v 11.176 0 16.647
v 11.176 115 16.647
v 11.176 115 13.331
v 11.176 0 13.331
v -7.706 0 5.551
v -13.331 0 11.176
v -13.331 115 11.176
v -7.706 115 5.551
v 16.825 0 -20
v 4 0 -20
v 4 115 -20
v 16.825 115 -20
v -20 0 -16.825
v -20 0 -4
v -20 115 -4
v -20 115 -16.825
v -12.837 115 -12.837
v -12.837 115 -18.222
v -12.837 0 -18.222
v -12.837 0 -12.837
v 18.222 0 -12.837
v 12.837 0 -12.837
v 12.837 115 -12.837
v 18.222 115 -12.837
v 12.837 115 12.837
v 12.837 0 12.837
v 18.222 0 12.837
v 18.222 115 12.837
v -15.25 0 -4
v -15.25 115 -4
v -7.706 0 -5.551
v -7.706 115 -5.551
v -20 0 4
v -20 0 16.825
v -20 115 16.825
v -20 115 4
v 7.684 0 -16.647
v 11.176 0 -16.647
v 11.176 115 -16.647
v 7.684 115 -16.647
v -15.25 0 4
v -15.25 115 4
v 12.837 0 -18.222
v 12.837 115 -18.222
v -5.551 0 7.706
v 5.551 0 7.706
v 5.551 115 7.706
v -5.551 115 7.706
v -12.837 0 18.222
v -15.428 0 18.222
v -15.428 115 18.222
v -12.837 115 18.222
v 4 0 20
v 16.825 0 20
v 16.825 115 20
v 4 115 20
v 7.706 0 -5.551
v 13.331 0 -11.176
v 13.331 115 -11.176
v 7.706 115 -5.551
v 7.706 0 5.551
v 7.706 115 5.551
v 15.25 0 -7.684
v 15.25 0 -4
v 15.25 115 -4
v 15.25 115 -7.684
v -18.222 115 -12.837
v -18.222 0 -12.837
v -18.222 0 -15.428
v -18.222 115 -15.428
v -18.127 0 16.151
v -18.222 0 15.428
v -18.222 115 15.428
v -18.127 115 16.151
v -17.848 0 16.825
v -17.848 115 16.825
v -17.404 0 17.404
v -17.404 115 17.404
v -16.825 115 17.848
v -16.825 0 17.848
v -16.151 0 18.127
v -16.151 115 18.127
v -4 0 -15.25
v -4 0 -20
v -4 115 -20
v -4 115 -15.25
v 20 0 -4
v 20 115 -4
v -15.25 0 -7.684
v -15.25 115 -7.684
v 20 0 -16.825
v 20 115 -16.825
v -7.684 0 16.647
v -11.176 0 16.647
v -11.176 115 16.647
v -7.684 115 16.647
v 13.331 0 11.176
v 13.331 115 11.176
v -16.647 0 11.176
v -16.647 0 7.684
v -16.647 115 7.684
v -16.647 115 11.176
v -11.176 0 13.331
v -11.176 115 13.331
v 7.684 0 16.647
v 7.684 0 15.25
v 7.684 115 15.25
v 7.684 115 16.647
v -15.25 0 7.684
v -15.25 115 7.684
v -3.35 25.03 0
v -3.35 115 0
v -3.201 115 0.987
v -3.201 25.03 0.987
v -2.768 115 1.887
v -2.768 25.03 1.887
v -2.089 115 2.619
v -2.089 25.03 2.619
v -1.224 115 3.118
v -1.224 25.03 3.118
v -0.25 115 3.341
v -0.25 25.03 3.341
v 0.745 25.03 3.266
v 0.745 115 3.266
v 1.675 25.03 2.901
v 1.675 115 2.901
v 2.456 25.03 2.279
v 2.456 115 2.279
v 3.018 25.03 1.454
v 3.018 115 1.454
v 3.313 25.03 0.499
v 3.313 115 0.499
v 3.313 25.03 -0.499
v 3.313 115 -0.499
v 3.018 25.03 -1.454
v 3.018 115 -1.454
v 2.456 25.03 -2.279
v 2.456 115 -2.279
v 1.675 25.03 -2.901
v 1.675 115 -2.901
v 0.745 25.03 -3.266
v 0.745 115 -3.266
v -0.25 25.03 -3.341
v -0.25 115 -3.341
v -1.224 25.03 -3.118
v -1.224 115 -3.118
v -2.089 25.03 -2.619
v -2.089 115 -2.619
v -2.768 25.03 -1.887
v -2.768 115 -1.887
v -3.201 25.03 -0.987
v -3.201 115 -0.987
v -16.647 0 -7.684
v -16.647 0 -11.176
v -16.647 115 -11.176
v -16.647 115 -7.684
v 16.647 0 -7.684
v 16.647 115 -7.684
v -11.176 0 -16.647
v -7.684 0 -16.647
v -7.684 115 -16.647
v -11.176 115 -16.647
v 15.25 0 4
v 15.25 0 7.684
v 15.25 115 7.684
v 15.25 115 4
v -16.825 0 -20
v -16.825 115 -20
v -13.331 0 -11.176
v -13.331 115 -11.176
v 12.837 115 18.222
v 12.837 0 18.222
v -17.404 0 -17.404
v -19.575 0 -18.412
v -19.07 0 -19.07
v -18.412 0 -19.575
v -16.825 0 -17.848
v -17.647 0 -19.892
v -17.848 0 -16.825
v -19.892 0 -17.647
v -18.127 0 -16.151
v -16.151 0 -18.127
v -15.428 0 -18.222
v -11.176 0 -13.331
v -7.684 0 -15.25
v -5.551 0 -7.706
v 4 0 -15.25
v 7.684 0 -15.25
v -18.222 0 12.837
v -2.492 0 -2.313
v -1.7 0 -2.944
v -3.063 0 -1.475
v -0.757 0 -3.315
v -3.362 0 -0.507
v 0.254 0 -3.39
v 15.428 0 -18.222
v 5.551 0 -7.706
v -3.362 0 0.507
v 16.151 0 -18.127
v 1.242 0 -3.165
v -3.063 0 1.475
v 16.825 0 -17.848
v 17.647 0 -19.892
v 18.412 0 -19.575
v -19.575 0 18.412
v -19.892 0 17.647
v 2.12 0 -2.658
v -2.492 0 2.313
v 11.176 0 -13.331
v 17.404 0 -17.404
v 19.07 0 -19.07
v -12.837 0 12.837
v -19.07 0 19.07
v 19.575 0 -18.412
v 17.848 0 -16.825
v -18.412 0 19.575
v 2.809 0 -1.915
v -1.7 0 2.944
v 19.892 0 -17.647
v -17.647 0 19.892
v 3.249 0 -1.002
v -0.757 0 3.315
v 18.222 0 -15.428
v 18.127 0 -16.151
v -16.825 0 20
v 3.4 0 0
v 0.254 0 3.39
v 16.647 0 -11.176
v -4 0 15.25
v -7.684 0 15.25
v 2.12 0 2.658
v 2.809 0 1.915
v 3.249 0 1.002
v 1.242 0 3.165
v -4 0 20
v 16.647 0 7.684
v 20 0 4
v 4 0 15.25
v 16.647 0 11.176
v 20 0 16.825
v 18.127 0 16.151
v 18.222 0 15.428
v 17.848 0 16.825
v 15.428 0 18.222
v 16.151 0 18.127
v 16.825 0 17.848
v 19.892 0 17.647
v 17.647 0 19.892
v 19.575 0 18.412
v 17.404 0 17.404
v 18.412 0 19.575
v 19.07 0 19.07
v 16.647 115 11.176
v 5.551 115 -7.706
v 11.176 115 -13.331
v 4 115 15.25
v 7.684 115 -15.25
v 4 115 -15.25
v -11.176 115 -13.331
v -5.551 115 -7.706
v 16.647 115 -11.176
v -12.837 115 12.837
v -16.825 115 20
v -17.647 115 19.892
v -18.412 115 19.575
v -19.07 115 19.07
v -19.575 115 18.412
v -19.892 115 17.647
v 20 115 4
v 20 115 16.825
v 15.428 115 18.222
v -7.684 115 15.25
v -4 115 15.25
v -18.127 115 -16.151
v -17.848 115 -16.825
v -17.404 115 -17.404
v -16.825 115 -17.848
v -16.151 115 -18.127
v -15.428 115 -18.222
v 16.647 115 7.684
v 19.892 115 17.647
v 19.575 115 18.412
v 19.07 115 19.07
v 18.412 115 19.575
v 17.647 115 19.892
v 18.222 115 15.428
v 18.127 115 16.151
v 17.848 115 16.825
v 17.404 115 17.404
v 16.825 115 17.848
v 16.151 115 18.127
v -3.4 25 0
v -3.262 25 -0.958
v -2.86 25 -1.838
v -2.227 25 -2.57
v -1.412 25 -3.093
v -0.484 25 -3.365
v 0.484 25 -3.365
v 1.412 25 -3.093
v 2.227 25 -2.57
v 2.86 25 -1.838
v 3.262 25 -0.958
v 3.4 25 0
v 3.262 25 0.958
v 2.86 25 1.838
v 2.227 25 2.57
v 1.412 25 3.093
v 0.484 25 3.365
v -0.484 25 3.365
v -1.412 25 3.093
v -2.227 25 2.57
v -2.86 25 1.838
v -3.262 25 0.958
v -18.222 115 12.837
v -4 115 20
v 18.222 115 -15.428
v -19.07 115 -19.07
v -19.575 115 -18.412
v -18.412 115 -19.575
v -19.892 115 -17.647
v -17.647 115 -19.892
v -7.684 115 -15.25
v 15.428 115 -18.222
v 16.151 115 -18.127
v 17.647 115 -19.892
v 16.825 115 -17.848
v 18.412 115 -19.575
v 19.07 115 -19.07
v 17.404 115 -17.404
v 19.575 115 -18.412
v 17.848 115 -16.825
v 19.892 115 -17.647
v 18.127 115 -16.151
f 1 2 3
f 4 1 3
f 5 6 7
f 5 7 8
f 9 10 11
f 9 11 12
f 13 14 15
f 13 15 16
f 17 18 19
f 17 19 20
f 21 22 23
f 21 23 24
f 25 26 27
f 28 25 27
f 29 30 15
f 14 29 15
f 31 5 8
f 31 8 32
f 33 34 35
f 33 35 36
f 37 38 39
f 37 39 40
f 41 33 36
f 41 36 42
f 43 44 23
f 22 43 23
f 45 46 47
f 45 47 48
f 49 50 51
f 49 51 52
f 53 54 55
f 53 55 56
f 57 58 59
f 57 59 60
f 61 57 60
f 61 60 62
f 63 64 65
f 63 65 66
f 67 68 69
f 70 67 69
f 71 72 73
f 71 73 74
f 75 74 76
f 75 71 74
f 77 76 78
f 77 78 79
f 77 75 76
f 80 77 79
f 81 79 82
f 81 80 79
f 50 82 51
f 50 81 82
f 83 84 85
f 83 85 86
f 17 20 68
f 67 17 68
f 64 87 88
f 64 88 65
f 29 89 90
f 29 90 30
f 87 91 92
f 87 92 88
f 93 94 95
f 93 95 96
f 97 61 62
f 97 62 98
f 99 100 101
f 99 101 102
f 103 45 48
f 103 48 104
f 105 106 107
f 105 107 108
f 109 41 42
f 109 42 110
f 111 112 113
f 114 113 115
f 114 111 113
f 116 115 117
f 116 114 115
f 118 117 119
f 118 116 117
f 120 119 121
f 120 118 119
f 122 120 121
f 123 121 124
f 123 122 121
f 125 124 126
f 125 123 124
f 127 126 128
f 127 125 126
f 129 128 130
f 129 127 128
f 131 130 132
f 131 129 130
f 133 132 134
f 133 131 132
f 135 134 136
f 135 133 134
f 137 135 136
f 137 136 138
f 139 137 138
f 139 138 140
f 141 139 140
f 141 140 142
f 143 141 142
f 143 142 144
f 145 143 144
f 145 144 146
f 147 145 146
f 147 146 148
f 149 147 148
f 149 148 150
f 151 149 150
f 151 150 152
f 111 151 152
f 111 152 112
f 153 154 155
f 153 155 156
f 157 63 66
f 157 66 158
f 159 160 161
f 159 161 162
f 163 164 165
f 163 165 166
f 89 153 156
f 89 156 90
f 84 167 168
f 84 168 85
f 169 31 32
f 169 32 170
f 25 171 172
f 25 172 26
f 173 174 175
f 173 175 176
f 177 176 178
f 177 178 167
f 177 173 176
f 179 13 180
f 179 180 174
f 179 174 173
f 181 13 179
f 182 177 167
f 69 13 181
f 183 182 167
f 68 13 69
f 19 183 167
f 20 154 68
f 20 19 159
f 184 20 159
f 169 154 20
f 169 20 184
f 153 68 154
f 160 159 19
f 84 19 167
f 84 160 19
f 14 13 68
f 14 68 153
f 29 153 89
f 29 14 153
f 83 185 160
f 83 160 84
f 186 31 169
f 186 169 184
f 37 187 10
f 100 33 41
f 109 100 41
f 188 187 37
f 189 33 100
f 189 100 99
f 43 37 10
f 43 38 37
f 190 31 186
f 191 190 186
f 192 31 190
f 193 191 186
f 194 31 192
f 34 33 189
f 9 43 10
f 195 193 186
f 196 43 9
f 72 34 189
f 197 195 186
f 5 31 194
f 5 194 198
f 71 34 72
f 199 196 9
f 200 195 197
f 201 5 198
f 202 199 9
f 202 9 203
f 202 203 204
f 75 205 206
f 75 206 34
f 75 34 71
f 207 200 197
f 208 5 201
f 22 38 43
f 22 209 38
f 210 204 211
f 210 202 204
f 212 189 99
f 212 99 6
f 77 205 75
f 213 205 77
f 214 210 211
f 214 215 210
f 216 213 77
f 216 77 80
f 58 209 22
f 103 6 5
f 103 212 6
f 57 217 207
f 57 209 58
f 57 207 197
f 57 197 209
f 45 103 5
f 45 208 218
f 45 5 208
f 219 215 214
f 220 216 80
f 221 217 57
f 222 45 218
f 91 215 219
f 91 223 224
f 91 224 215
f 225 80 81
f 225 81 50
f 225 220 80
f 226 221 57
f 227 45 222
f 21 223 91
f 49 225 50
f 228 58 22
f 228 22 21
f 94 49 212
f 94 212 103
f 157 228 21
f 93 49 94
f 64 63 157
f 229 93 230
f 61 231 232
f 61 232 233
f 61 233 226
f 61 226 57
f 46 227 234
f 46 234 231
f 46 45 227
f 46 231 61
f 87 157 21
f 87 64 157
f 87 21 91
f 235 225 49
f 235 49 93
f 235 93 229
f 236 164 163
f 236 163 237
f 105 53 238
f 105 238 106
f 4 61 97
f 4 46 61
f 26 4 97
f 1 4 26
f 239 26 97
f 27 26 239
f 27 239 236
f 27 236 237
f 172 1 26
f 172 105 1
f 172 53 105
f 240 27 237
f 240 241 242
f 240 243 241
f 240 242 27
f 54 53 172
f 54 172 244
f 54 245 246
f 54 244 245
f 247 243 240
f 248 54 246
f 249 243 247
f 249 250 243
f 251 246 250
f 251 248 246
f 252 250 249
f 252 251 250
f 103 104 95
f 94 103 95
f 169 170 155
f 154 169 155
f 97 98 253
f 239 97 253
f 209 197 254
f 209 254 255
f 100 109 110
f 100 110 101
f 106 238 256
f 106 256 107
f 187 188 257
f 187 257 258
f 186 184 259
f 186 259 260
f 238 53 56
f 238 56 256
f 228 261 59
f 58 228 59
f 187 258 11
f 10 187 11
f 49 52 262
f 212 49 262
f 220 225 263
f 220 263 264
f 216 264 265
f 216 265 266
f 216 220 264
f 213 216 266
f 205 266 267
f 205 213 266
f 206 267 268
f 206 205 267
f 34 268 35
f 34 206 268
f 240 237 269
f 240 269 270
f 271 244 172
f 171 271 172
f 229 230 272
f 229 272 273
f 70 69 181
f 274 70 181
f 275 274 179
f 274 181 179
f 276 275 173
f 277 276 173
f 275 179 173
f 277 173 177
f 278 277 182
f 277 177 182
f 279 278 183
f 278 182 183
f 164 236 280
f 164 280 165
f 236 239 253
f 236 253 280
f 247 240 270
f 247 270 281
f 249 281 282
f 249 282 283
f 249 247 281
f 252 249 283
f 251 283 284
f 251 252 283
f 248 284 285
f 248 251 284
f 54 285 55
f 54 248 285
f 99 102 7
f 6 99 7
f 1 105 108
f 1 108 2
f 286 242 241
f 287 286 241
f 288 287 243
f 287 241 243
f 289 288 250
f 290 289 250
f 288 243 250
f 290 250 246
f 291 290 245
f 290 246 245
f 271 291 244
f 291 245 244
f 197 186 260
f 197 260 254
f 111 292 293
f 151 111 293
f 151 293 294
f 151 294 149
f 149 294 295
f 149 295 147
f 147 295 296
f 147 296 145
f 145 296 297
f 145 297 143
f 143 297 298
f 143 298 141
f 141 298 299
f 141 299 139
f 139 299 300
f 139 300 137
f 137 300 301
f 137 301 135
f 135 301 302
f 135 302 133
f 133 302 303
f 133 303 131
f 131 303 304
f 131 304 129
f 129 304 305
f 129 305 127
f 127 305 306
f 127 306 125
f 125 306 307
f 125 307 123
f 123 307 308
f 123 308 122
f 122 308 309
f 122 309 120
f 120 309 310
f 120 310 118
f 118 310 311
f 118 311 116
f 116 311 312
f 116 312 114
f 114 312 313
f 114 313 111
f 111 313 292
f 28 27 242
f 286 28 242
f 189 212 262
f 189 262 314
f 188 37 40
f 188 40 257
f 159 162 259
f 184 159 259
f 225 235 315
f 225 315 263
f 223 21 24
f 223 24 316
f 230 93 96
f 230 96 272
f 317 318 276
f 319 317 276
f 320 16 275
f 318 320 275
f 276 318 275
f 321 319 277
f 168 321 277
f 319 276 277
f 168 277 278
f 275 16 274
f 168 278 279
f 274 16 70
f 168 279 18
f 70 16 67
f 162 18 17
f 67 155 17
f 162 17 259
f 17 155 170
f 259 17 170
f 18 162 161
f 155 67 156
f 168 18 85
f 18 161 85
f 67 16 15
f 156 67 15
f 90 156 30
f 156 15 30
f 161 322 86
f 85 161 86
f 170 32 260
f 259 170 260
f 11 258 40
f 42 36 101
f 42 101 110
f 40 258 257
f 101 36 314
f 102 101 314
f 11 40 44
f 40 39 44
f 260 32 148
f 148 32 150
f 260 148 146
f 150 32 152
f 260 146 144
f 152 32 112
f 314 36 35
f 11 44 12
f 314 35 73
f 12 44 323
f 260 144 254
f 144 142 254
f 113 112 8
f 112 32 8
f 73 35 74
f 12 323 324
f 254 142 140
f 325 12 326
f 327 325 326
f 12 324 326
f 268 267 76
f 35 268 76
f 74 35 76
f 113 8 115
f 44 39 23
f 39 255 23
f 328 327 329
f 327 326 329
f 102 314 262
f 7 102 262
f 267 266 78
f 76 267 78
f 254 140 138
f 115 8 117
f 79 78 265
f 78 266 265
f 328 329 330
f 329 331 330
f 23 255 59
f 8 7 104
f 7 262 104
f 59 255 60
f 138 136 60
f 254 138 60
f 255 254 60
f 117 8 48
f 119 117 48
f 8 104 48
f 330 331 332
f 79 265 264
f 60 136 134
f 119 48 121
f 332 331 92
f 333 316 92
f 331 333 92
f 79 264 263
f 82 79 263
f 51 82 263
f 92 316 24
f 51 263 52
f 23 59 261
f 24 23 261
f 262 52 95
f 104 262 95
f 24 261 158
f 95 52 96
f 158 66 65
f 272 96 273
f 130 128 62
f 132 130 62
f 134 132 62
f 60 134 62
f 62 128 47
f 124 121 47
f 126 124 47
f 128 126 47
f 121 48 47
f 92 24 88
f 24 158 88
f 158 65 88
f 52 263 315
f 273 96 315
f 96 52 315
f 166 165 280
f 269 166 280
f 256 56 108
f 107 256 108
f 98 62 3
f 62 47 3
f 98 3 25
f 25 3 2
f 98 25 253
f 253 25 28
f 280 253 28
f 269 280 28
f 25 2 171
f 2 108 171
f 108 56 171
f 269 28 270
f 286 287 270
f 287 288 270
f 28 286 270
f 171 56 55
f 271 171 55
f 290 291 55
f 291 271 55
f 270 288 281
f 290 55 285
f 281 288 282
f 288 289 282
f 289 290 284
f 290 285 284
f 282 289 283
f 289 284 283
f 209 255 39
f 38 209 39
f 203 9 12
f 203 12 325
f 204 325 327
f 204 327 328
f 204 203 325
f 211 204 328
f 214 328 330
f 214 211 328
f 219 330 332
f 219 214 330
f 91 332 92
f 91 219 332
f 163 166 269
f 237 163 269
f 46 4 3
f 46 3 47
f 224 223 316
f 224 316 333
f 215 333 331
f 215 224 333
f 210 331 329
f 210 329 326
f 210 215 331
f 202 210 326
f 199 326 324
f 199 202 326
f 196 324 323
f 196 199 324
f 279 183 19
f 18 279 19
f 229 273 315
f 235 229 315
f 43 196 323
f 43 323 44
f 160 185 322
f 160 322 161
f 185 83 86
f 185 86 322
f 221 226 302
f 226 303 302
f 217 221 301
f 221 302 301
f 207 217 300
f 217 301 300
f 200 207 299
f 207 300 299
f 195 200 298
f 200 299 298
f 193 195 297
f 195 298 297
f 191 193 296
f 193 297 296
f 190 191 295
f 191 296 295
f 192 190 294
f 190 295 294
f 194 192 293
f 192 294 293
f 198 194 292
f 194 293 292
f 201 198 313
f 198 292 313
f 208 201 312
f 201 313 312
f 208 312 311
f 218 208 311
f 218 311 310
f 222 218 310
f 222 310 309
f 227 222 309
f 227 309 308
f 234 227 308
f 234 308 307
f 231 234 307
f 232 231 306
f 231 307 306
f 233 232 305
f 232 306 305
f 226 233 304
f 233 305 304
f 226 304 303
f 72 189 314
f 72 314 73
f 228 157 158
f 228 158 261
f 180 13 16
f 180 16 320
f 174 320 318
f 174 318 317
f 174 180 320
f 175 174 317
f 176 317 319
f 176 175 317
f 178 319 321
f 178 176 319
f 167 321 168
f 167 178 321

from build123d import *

# Parameters (mm, degrees)
SKETCH2_R                            = 3.35
F_40_SERIES_TS40_40LM_650033_2_DEPTH = 115
M8X1_25_TAPPED_HOLE3_D               = 6.8
M8X1_25_TAPPED_HOLE3_DEPTH           = 25
M8X1_25_TAPPED_HOLE3_TIP             = 2.042926105


with BuildPart() as part:
    # Sketch2 → 40 series TS40-40LM-650033(2) (new body)
    with BuildSketch(Plane(origin=(0, 0, 0), x_dir=(-1, 0, 0), z_dir=(0, 1, 0))):
        with BuildLine():
            Line((-7.7064, 0), (-7.7064, 5.551138531))
            Line((-7.7064, 5.551138531), (-13.331261469, 11.176))
            Line((-13.331261469, 11.176), (-16.6472, 11.176))
            Line((-16.6472, 11.176), (-16.6472, 7.6835))
            Line((-16.6472, 7.6835), (-15.2502, 7.6835))
            Line((-15.2502, 7.6835), (-15.2502, 4.0005))
            Line((-15.2502, 4.0005), (-20, 4.0005))
            Line((-20, 4.0005), (-20, 16.825))
            ThreePointArc((-20, 16.825), (-19.07006403, 19.07006403), (-16.825, 20))
            Line((-16.825, 20), (-4.0005, 20))
            Line((-4.0005, 20), (-4.0005, 15.2502))
            Line((-4.0005, 15.2502), (-7.6835, 15.2502))
            Line((-7.6835, 15.2502), (-7.6835, 16.6472))
            Line((-7.6835, 16.6472), (-11.176, 16.6472))
            Line((-11.176, 16.6472), (-11.176, 13.331261469))
            Line((-11.176, 13.331261469), (-5.551138531, 7.7064))
            Line((-5.551138531, 7.7064), (0, 7.7064))
            Line((0, 7.7064), (5.551138531, 7.7064))
            Line((5.551138531, 7.7064), (11.176, 13.331261469))
            Line((11.176, 13.331261469), (11.176, 16.6472))
            Line((11.176, 16.6472), (7.6835, 16.6472))
            Line((7.6835, 16.6472), (7.6835, 15.2502))
            Line((7.6835, 15.2502), (4.0005, 15.2502))
            Line((4.0005, 15.2502), (4.0005, 20))
            Line((4.0005, 20), (16.825, 20))
            ThreePointArc((16.825, 20), (19.07006403, 19.07006403), (20, 16.825))
            Line((20, 16.825), (20, 4.0005))
            Line((20, 4.0005), (15.2502, 4.0005))
            Line((15.2502, 4.0005), (15.2502, 7.6835))
            Line((15.2502, 7.6835), (16.6472, 7.6835))
            Line((16.6472, 7.6835), (16.6472, 11.176))
            Line((16.6472, 11.176), (13.331261469, 11.176))
            Line((13.331261469, 11.176), (7.7064, 5.551138531))
            Line((7.7064, 5.551138531), (7.7064, 0))
            Line((7.7064, 0), (7.7064, -5.551138531))
            Line((7.7064, -5.551138531), (13.331261469, -11.176))
            Line((13.331261469, -11.176), (16.6472, -11.176))
            Line((16.6472, -11.176), (16.6472, -7.6835))
            Line((16.6472, -7.6835), (15.2502, -7.6835))
            Line((15.2502, -7.6835), (15.2502, -4.0005))
            Line((15.2502, -4.0005), (20, -4.0005))
            Line((20, -4.0005), (20, -16.825))
            ThreePointArc((20, -16.825), (19.07006403, -19.07006403), (16.825, -20))
            Line((16.825, -20), (4.0005, -20))
            Line((4.0005, -20), (4.0005, -15.2502))
            Line((4.0005, -15.2502), (7.6835, -15.2502))
            Line((7.6835, -15.2502), (7.6835, -16.6472))
            Line((7.6835, -16.6472), (11.176, -16.6472))
            Line((11.176, -16.6472), (11.176, -13.331261469))
            Line((11.176, -13.331261469), (5.551138531, -7.7064))
            Line((5.551138531, -7.7064), (0, -7.7064))
            Line((0, -7.7064), (-5.551138531, -7.7064))
            Line((-5.551138531, -7.7064), (-11.176, -13.331261469))
            Line((-11.176, -13.331261469), (-11.176, -16.6472))
            Line((-11.176, -16.6472), (-7.6835, -16.6472))
            Line((-7.6835, -16.6472), (-7.6835, -15.2502))
            Line((-7.6835, -15.2502), (-4.0005, -15.2502))
            Line((-4.0005, -15.2502), (-4.0005, -20))
            Line((-4.0005, -20), (-16.825, -20))
            ThreePointArc((-16.825, -20), (-19.07006403, -19.07006403), (-20, -16.825))
            Line((-20, -16.825), (-20, -4.0005))
            Line((-20, -4.0005), (-15.2502, -4.0005))
            Line((-15.2502, -4.0005), (-15.2502, -7.6835))
            Line((-15.2502, -7.6835), (-16.6472, -7.6835))
            Line((-16.6472, -7.6835), (-16.6472, -11.176))
            Line((-16.6472, -11.176), (-13.331261469, -11.176))
            Line((-13.331261469, -11.176), (-7.7064, -5.551138531))
            Line((-7.7064, -5.551138531), (-7.7064, 0))
        make_face()
        Circle(SKETCH2_R, mode=Mode.SUBTRACT)
        with BuildLine():
            Line((18.222, 12.8372), (18.222, 15.428))
            ThreePointArc((18.222, 15.428), (17.403656347, 17.403656347), (15.428, 18.222))
            Line((15.428, 18.222), (12.8372, 18.222))
            Line((12.8372, 18.222), (12.8372, 12.8372))
            Line((12.8372, 12.8372), (18.222, 12.8372))
        make_face(mode=Mode.SUBTRACT)
        with BuildLine():
            Line((12.8372, -12.8372), (18.222, -12.8372))
            Line((18.222, -12.8372), (18.222, -15.428))
            ThreePointArc((18.222, -15.428), (17.403656347, -17.403656347), (15.428, -18.222))
            Line((15.428, -18.222), (12.8372, -18.222))
            Line((12.8372, -18.222), (12.8372, -12.8372))
        make_face(mode=Mode.SUBTRACT)
        with BuildLine():
            Line((-18.222, -12.8372), (-18.222, -15.428))
            ThreePointArc((-18.222, -15.428), (-17.403656347, -17.403656347), (-15.428, -18.222))
            Line((-15.428, -18.222), (-12.8372, -18.222))
            Line((-12.8372, -18.222), (-12.8372, -12.8372))
            Line((-12.8372, -12.8372), (-18.222, -12.8372))
        make_face(mode=Mode.SUBTRACT)
        with BuildLine():
            Line((-12.8372, 12.8372), (-18.222, 12.8372))
            Line((-18.222, 12.8372), (-18.222, 15.428))
            ThreePointArc((-18.222, 15.428), (-17.403656347, 17.403656347), (-15.428, 18.222))
            Line((-15.428, 18.222), (-12.8372, 18.222))
            Line((-12.8372, 18.222), (-12.8372, 12.8372))
        make_face(mode=Mode.SUBTRACT)
    extrude(amount=F_40_SERIES_TS40_40LM_650033_2_DEPTH)

    # M8x1.25 Tapped Hole3
    with Locations(Plane(origin=(0, 0, 0), x_dir=(-1, 0, 0), z_dir=(0, -1, 0))):
        with Locations((0, 0)):
            Hole(M8X1_25_TAPPED_HOLE3_D / 2, depth=M8X1_25_TAPPED_HOLE3_DEPTH)
            with Locations((0, 0, -(M8X1_25_TAPPED_HOLE3_DEPTH + M8X1_25_TAPPED_HOLE3_TIP / 2))):  # 118° drill point
                Cone(0, M8X1_25_TAPPED_HOLE3_D / 2, M8X1_25_TAPPED_HOLE3_TIP, mode=Mode.SUBTRACT)


solid = part.part
